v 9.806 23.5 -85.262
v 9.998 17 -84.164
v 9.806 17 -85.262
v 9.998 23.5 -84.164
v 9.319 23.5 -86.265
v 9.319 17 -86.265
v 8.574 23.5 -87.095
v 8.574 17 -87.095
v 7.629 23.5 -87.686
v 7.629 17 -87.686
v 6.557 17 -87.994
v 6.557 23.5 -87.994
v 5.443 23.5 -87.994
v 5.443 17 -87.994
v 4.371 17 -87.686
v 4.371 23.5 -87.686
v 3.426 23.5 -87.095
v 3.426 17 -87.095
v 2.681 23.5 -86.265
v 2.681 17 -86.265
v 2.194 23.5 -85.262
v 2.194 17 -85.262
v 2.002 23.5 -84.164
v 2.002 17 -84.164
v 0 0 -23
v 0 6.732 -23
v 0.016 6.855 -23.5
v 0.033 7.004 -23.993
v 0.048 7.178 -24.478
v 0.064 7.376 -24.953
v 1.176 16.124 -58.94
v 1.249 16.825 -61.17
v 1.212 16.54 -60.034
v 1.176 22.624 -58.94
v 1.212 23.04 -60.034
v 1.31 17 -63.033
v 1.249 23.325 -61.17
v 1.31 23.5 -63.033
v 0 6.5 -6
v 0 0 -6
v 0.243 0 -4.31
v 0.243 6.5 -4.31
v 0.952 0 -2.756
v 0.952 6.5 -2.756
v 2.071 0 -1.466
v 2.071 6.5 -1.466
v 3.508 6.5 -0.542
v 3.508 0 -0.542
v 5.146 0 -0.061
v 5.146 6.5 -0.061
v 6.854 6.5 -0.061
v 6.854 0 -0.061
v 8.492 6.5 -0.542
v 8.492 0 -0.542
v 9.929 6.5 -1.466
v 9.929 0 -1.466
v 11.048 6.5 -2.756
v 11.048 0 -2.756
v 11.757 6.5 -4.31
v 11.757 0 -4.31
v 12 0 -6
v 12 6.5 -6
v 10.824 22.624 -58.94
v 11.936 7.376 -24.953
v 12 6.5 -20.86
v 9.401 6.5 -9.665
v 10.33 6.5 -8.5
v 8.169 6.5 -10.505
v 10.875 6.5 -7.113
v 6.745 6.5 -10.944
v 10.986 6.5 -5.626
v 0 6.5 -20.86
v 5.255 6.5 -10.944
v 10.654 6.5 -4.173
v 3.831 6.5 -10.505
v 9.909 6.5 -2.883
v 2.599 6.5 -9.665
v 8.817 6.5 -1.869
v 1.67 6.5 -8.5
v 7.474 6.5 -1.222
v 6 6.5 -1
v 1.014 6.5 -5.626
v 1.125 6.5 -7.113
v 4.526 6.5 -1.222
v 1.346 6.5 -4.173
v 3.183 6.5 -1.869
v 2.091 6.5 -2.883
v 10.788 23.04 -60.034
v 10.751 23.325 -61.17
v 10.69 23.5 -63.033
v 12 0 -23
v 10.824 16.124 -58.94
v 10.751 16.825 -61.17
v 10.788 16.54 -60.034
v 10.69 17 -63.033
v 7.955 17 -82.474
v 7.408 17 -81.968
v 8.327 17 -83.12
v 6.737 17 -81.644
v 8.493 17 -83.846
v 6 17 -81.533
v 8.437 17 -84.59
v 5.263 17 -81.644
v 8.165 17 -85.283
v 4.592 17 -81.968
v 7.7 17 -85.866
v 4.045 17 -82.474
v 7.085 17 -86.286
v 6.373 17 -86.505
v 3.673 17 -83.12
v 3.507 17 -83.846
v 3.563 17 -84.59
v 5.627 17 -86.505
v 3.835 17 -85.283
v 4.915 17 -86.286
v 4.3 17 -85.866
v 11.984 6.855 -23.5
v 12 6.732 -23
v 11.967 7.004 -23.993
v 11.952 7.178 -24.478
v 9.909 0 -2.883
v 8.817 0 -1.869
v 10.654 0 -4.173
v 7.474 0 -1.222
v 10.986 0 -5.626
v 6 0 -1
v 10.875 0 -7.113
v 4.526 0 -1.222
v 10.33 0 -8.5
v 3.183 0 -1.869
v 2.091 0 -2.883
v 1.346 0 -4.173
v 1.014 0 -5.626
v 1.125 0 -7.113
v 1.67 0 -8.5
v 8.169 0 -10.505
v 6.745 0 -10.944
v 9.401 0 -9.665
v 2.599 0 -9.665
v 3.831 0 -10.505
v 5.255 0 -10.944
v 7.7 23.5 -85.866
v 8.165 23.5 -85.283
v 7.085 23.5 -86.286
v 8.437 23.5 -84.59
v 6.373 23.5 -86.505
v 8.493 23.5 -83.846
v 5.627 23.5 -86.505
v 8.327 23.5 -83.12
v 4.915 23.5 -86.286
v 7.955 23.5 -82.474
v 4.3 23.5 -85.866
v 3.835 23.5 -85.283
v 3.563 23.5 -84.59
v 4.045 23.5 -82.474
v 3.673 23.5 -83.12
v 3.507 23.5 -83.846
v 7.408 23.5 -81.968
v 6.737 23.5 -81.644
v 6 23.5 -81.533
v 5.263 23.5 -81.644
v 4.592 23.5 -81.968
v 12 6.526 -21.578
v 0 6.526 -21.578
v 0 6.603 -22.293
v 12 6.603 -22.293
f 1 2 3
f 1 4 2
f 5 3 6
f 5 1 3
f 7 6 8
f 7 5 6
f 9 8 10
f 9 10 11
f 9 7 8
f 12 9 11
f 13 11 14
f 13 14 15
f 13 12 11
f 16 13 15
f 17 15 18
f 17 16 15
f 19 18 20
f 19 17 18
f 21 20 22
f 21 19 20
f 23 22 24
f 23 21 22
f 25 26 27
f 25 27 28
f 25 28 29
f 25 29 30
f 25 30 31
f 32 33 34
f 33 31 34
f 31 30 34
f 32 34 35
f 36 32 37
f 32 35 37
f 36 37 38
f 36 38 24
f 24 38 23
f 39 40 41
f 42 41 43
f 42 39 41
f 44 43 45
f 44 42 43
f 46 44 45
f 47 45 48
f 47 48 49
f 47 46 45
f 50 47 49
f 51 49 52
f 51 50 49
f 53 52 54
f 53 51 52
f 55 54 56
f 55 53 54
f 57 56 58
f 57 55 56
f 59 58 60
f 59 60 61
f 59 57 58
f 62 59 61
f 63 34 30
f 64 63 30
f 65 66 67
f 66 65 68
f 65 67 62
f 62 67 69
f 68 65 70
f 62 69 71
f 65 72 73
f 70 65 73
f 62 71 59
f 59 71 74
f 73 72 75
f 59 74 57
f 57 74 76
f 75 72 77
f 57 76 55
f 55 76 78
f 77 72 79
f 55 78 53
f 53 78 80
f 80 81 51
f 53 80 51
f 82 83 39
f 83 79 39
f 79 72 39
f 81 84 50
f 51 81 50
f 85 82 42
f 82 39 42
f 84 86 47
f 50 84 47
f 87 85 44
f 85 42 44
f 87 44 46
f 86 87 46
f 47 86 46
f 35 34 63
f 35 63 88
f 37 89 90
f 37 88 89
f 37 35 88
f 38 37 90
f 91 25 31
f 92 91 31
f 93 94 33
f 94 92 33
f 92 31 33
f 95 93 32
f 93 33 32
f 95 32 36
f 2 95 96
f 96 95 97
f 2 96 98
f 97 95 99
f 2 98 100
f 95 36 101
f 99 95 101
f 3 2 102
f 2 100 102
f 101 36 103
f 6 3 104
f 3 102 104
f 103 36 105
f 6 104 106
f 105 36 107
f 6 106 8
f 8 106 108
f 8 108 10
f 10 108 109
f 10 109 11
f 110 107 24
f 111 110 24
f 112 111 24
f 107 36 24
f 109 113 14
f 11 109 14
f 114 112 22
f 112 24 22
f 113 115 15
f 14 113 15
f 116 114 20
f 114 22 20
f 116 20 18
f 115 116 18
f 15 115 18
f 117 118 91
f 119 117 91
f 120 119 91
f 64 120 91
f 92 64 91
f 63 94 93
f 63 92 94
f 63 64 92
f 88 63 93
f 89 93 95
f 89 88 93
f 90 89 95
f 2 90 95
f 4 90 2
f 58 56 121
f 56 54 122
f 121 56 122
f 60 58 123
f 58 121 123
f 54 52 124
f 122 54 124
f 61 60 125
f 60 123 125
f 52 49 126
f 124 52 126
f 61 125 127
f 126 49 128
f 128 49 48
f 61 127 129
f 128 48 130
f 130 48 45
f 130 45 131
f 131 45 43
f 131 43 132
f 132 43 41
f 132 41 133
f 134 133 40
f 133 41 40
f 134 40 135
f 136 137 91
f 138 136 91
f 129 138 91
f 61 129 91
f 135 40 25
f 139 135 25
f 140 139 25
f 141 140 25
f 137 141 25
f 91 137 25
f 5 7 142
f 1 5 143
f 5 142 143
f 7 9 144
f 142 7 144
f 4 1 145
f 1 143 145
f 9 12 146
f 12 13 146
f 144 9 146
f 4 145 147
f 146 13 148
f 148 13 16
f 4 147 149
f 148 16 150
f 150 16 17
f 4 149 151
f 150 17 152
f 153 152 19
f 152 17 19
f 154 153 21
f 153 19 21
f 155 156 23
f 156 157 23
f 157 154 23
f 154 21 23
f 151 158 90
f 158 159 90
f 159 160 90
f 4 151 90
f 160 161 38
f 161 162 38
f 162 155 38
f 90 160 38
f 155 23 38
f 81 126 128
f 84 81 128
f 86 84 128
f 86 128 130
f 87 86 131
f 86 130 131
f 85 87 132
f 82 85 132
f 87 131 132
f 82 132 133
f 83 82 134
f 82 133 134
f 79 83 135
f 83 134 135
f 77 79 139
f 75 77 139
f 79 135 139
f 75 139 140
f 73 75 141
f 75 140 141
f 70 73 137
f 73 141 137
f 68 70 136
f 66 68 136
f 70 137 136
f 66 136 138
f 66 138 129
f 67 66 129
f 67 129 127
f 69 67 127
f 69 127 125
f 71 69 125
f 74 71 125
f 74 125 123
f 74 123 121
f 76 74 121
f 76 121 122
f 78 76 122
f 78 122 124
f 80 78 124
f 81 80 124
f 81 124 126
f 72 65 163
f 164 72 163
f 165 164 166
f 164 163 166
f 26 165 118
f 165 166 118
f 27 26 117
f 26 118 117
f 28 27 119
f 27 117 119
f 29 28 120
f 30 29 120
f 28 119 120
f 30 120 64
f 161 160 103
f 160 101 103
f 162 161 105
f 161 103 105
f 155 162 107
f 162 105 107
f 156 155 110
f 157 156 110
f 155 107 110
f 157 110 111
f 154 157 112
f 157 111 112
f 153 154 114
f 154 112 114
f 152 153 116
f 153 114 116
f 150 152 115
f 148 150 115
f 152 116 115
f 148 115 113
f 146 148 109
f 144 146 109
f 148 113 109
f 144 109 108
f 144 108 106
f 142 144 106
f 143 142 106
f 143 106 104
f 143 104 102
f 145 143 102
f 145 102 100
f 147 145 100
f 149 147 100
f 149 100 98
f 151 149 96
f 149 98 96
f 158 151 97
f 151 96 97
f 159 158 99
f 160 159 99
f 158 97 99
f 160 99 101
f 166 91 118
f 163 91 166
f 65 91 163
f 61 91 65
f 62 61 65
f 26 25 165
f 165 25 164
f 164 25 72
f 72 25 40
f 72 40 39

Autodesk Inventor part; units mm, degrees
ref_plane "YZ Plane" through (0, 0, 0) normal (1, 0, 0) x (0, 1, 0)
ref_plane "XZ Plane" through (0, 0, 0) normal (0, 1, 0) x (-1, 0, 0)
ref_plane "XY Plane" through (0, 0, 0) normal (0, 0, 1) x (1, 0, 0)
sketch "Sketch19" plane through (0, 0, 0) normal (1, 0, 0) x (0, 1, 0)
  line L0 (0, 0) -> (0, -23)
  line L1 (0, -23) -> (16.1239, -58.9399)
  line L2 (17, -63.0332) -> (17, -88.0332)
  line L3 (17, -88.0332) -> (23.5, -88.0332)
  line L4 (23.5, -88.0332) -> (23.5, -63.0332)
  line L5 (22.6239, -58.9399) -> (6.5, -23)
  line L6 (6.5, -23) -> (6.5, 0)
  line L7 (6.5, 0) -> (0, 0)
  arc A0 (17, -63.0332) -> (16.1239, -58.9399) centre (7, -63.0332) ccw
  arc A1 (23.5, -63.0332) -> (22.6239, -58.9399) centre (13.5, -63.0332) ccw
  point P0 (23.2785, -60.9402)
  dimension "d79" = 10
  dimension "d80" = 10
  dimension "d82" = 6.5
  dimension "d83" = 17
  dimension "d84" = 25
  dimension "d85" = 23
  dimension "d86" = 37.9402
extrude "Extrusion7" add sketch "Sketch19" along normal blind 12
sketch "Sketch20" plane through (0, 6.5, 0) normal (0, 1, 0) x (1, 0, 0)
  circle A0 centre (6, 6) radius 6
  line L0 (0, 0) -> (12, 0) projected
  line L1 (0, 0) -> (12, 0) projected
  line L2 (0, 0) -> (0, 6)
  line L3 (0, 0) -> (0, 23) projected
  line L4 (12, 0) -> (12, 6)
  point P0 (6, 0)
  point P1 (6, 0)
  dimension "d89" = 12
extrude "Extrusion8" cut sketch "Sketch20" against normal blind 12 contours L4 L0 A0 | A0 L0 L2
sketch "Sketch21" plane through (0, 23.5, -63.0332) normal (0, 1, 0) x (1, 0, 0)
  circle A0 centre (6, 21) radius 4
  line L0 (0, 25) -> (12, 25) projected
  arc A1 (0, -57.0332) -> (12, -57.0332) centre (6, -57.0332) ccw projected
  line L1 (12, -40.0332) -> (12, -57.0332) projected
  line L2 (0, -40.0332) -> (12, -40.0332) projected
  line L3 (0, -40.0332) -> (0, -57.0332) projected
  line L4 (0, -40.0332) -> (2.0021, 21.1309)
  line L5 (12, -40.0332) -> (12, -4.0933) projected
  line L6 (12, -40.0332) -> (9.9979, 21.1309)
  line L7 (0, 25) -> (0, 0) projected
  line L8 (0, -40.0332) -> (0, 25)
  line L9 (0, 25) -> (6, 25)
  line L10 (6, 25) -> (12, 25)
  line L11 (12, 0) -> (12, 25) projected
  line L12 (12, 25) -> (12, -40.0332)
  point P0 (0, -63.0332)
  point P1 (12, -4.0933)
  point P2 (12, 0)
  dimension "d93" = 8
extrude "Extrusion9" cut sketch "Sketch21" against normal up to surface (23.5 mm away) contours A0 L0 L11 L12 L5 L6 | L4 L8 L7 L0 A0
sketch "Sketch22" plane through (6, 6.5, -6) normal (0, 1, 0) x (1, 0, 0)
  arc A0 (-6, 0) -> (6, 0) centre (0, 0) ccw projected
  point P0 (-6, -6)
hole "Hole1" at (6, 6.5, -6) direction (0, -1, 0) diameter 10 end through all
sketch "Sketch23" plane through (6, 23.5, -84.0332) normal (0, 1, 0) x (1, 0, 0)
  arc A0 (3.9979, 0.1309) -> (-3.9979, 0.1309) centre (0, 0) ccw projected
  point P0 (-6, -84.0332)
hole "Hole2" at (6, 23.5, -84.0332) direction (0, -1, 0) diameter 5 end through all
fillet "Fillet1" radius 10 1 edges at (6, 6.5, -23)
properties part number "47B"
